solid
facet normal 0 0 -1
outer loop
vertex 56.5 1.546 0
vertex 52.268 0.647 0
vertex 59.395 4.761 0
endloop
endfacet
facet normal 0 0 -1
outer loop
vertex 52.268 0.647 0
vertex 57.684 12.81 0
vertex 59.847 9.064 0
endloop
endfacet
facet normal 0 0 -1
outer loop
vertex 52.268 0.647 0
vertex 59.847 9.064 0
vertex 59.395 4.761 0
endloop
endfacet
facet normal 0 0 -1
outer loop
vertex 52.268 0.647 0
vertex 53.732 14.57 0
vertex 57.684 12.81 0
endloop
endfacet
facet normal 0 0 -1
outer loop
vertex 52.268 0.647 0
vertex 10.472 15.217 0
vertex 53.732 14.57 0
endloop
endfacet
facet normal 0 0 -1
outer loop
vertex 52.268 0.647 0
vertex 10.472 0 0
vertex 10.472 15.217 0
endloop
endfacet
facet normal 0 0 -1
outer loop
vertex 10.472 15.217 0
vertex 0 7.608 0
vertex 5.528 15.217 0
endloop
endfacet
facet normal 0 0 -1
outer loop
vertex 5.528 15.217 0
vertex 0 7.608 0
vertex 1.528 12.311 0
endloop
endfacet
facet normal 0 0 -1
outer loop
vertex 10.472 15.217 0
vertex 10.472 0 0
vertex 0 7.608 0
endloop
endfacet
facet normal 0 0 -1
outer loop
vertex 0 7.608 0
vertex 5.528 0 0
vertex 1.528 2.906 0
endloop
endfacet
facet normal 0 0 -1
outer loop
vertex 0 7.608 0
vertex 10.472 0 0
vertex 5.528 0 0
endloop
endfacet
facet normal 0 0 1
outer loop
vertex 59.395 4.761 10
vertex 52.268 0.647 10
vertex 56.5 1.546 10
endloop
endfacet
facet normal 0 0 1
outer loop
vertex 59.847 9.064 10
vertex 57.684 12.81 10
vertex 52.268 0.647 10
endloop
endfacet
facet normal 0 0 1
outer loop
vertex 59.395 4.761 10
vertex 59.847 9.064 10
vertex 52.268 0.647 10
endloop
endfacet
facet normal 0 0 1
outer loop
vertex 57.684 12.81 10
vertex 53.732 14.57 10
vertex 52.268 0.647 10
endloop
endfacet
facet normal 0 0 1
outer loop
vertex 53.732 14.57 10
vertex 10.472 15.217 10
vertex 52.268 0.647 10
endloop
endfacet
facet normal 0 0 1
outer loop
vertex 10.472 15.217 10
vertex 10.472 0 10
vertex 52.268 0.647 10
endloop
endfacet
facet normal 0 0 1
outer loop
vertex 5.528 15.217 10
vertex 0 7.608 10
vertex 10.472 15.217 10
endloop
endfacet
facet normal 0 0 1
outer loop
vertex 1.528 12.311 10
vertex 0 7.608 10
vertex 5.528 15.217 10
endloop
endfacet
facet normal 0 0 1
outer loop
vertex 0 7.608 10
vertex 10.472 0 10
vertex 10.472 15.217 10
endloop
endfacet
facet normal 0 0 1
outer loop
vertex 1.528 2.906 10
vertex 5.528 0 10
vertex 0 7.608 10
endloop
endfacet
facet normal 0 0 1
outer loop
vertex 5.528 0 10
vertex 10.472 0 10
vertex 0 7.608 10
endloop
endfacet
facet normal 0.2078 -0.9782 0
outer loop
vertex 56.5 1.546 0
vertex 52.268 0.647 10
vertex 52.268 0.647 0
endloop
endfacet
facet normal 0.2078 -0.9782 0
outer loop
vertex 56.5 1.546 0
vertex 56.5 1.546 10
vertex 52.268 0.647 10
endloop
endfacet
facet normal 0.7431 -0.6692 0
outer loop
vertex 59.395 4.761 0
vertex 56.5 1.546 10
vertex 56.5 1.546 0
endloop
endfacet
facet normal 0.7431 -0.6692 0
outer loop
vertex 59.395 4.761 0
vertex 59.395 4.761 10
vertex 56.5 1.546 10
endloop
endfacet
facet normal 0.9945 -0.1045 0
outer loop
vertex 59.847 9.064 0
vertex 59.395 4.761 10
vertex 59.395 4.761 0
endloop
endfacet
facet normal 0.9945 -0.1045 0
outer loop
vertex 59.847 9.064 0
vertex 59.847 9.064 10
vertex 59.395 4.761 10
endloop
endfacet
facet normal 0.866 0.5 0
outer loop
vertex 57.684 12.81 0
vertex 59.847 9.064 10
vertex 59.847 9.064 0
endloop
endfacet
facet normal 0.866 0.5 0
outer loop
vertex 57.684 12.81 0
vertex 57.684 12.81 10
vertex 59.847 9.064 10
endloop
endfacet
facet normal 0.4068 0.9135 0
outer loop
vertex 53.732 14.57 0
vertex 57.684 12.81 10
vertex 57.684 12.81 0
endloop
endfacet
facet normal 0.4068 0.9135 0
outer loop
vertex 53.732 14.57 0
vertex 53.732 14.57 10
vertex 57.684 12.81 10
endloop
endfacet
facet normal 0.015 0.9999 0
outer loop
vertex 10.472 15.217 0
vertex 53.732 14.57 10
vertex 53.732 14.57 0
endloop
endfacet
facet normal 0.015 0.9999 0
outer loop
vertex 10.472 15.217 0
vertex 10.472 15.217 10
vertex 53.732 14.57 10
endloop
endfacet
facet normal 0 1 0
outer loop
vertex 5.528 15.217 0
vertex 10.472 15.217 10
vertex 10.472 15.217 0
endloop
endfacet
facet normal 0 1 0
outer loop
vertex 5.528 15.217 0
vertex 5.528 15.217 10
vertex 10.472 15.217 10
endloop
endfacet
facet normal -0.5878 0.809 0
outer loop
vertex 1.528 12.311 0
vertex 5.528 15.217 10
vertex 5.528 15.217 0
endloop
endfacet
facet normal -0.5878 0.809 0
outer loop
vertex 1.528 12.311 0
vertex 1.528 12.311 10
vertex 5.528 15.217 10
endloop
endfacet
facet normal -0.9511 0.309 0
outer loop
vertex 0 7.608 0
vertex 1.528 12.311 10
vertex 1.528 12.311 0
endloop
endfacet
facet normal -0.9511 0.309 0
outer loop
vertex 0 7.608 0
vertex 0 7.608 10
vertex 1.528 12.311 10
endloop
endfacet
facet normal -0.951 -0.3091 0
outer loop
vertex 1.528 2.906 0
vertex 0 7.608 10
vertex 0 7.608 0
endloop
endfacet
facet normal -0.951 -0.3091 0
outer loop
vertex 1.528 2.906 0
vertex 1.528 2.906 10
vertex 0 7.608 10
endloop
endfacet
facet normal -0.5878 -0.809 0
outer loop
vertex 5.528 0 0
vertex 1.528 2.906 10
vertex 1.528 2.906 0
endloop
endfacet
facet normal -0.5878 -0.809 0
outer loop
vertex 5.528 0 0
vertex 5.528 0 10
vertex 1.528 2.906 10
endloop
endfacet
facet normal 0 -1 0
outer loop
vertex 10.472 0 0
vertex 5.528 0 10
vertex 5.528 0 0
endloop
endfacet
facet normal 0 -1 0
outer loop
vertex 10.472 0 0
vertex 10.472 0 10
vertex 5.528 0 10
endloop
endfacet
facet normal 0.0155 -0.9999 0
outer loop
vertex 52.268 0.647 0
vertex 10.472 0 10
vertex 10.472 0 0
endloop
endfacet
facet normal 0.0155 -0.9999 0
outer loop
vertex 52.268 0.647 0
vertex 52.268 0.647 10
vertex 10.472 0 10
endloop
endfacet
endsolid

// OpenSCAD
$fn = 32;

// ----------------------------------------------------------------------
// Lever arm: two bosses 16 and 14 mm, 45 mm between centres
// ----------------------------------------------------------------------

// --- parameters (mm) ---
profile_height = 10;      // extrusion height
profile_points = 13;      // points of the closed outline

profile = [[0, 7.608], [1.528, 2.906], [5.528, 0], [10.472, 0], [52.268, 0.647], [56.5, 1.546], [59.395, 4.761], [59.847, 9.064], [57.684, 12.81], [53.732, 14.57], [10.472, 15.217], [5.528, 15.217], [1.528, 12.311]];  // single closed polygon, 13 points, counter clockwise

// --- the one profile operation ---
linear_extrude(height = profile_height) polygon(points = profile);
